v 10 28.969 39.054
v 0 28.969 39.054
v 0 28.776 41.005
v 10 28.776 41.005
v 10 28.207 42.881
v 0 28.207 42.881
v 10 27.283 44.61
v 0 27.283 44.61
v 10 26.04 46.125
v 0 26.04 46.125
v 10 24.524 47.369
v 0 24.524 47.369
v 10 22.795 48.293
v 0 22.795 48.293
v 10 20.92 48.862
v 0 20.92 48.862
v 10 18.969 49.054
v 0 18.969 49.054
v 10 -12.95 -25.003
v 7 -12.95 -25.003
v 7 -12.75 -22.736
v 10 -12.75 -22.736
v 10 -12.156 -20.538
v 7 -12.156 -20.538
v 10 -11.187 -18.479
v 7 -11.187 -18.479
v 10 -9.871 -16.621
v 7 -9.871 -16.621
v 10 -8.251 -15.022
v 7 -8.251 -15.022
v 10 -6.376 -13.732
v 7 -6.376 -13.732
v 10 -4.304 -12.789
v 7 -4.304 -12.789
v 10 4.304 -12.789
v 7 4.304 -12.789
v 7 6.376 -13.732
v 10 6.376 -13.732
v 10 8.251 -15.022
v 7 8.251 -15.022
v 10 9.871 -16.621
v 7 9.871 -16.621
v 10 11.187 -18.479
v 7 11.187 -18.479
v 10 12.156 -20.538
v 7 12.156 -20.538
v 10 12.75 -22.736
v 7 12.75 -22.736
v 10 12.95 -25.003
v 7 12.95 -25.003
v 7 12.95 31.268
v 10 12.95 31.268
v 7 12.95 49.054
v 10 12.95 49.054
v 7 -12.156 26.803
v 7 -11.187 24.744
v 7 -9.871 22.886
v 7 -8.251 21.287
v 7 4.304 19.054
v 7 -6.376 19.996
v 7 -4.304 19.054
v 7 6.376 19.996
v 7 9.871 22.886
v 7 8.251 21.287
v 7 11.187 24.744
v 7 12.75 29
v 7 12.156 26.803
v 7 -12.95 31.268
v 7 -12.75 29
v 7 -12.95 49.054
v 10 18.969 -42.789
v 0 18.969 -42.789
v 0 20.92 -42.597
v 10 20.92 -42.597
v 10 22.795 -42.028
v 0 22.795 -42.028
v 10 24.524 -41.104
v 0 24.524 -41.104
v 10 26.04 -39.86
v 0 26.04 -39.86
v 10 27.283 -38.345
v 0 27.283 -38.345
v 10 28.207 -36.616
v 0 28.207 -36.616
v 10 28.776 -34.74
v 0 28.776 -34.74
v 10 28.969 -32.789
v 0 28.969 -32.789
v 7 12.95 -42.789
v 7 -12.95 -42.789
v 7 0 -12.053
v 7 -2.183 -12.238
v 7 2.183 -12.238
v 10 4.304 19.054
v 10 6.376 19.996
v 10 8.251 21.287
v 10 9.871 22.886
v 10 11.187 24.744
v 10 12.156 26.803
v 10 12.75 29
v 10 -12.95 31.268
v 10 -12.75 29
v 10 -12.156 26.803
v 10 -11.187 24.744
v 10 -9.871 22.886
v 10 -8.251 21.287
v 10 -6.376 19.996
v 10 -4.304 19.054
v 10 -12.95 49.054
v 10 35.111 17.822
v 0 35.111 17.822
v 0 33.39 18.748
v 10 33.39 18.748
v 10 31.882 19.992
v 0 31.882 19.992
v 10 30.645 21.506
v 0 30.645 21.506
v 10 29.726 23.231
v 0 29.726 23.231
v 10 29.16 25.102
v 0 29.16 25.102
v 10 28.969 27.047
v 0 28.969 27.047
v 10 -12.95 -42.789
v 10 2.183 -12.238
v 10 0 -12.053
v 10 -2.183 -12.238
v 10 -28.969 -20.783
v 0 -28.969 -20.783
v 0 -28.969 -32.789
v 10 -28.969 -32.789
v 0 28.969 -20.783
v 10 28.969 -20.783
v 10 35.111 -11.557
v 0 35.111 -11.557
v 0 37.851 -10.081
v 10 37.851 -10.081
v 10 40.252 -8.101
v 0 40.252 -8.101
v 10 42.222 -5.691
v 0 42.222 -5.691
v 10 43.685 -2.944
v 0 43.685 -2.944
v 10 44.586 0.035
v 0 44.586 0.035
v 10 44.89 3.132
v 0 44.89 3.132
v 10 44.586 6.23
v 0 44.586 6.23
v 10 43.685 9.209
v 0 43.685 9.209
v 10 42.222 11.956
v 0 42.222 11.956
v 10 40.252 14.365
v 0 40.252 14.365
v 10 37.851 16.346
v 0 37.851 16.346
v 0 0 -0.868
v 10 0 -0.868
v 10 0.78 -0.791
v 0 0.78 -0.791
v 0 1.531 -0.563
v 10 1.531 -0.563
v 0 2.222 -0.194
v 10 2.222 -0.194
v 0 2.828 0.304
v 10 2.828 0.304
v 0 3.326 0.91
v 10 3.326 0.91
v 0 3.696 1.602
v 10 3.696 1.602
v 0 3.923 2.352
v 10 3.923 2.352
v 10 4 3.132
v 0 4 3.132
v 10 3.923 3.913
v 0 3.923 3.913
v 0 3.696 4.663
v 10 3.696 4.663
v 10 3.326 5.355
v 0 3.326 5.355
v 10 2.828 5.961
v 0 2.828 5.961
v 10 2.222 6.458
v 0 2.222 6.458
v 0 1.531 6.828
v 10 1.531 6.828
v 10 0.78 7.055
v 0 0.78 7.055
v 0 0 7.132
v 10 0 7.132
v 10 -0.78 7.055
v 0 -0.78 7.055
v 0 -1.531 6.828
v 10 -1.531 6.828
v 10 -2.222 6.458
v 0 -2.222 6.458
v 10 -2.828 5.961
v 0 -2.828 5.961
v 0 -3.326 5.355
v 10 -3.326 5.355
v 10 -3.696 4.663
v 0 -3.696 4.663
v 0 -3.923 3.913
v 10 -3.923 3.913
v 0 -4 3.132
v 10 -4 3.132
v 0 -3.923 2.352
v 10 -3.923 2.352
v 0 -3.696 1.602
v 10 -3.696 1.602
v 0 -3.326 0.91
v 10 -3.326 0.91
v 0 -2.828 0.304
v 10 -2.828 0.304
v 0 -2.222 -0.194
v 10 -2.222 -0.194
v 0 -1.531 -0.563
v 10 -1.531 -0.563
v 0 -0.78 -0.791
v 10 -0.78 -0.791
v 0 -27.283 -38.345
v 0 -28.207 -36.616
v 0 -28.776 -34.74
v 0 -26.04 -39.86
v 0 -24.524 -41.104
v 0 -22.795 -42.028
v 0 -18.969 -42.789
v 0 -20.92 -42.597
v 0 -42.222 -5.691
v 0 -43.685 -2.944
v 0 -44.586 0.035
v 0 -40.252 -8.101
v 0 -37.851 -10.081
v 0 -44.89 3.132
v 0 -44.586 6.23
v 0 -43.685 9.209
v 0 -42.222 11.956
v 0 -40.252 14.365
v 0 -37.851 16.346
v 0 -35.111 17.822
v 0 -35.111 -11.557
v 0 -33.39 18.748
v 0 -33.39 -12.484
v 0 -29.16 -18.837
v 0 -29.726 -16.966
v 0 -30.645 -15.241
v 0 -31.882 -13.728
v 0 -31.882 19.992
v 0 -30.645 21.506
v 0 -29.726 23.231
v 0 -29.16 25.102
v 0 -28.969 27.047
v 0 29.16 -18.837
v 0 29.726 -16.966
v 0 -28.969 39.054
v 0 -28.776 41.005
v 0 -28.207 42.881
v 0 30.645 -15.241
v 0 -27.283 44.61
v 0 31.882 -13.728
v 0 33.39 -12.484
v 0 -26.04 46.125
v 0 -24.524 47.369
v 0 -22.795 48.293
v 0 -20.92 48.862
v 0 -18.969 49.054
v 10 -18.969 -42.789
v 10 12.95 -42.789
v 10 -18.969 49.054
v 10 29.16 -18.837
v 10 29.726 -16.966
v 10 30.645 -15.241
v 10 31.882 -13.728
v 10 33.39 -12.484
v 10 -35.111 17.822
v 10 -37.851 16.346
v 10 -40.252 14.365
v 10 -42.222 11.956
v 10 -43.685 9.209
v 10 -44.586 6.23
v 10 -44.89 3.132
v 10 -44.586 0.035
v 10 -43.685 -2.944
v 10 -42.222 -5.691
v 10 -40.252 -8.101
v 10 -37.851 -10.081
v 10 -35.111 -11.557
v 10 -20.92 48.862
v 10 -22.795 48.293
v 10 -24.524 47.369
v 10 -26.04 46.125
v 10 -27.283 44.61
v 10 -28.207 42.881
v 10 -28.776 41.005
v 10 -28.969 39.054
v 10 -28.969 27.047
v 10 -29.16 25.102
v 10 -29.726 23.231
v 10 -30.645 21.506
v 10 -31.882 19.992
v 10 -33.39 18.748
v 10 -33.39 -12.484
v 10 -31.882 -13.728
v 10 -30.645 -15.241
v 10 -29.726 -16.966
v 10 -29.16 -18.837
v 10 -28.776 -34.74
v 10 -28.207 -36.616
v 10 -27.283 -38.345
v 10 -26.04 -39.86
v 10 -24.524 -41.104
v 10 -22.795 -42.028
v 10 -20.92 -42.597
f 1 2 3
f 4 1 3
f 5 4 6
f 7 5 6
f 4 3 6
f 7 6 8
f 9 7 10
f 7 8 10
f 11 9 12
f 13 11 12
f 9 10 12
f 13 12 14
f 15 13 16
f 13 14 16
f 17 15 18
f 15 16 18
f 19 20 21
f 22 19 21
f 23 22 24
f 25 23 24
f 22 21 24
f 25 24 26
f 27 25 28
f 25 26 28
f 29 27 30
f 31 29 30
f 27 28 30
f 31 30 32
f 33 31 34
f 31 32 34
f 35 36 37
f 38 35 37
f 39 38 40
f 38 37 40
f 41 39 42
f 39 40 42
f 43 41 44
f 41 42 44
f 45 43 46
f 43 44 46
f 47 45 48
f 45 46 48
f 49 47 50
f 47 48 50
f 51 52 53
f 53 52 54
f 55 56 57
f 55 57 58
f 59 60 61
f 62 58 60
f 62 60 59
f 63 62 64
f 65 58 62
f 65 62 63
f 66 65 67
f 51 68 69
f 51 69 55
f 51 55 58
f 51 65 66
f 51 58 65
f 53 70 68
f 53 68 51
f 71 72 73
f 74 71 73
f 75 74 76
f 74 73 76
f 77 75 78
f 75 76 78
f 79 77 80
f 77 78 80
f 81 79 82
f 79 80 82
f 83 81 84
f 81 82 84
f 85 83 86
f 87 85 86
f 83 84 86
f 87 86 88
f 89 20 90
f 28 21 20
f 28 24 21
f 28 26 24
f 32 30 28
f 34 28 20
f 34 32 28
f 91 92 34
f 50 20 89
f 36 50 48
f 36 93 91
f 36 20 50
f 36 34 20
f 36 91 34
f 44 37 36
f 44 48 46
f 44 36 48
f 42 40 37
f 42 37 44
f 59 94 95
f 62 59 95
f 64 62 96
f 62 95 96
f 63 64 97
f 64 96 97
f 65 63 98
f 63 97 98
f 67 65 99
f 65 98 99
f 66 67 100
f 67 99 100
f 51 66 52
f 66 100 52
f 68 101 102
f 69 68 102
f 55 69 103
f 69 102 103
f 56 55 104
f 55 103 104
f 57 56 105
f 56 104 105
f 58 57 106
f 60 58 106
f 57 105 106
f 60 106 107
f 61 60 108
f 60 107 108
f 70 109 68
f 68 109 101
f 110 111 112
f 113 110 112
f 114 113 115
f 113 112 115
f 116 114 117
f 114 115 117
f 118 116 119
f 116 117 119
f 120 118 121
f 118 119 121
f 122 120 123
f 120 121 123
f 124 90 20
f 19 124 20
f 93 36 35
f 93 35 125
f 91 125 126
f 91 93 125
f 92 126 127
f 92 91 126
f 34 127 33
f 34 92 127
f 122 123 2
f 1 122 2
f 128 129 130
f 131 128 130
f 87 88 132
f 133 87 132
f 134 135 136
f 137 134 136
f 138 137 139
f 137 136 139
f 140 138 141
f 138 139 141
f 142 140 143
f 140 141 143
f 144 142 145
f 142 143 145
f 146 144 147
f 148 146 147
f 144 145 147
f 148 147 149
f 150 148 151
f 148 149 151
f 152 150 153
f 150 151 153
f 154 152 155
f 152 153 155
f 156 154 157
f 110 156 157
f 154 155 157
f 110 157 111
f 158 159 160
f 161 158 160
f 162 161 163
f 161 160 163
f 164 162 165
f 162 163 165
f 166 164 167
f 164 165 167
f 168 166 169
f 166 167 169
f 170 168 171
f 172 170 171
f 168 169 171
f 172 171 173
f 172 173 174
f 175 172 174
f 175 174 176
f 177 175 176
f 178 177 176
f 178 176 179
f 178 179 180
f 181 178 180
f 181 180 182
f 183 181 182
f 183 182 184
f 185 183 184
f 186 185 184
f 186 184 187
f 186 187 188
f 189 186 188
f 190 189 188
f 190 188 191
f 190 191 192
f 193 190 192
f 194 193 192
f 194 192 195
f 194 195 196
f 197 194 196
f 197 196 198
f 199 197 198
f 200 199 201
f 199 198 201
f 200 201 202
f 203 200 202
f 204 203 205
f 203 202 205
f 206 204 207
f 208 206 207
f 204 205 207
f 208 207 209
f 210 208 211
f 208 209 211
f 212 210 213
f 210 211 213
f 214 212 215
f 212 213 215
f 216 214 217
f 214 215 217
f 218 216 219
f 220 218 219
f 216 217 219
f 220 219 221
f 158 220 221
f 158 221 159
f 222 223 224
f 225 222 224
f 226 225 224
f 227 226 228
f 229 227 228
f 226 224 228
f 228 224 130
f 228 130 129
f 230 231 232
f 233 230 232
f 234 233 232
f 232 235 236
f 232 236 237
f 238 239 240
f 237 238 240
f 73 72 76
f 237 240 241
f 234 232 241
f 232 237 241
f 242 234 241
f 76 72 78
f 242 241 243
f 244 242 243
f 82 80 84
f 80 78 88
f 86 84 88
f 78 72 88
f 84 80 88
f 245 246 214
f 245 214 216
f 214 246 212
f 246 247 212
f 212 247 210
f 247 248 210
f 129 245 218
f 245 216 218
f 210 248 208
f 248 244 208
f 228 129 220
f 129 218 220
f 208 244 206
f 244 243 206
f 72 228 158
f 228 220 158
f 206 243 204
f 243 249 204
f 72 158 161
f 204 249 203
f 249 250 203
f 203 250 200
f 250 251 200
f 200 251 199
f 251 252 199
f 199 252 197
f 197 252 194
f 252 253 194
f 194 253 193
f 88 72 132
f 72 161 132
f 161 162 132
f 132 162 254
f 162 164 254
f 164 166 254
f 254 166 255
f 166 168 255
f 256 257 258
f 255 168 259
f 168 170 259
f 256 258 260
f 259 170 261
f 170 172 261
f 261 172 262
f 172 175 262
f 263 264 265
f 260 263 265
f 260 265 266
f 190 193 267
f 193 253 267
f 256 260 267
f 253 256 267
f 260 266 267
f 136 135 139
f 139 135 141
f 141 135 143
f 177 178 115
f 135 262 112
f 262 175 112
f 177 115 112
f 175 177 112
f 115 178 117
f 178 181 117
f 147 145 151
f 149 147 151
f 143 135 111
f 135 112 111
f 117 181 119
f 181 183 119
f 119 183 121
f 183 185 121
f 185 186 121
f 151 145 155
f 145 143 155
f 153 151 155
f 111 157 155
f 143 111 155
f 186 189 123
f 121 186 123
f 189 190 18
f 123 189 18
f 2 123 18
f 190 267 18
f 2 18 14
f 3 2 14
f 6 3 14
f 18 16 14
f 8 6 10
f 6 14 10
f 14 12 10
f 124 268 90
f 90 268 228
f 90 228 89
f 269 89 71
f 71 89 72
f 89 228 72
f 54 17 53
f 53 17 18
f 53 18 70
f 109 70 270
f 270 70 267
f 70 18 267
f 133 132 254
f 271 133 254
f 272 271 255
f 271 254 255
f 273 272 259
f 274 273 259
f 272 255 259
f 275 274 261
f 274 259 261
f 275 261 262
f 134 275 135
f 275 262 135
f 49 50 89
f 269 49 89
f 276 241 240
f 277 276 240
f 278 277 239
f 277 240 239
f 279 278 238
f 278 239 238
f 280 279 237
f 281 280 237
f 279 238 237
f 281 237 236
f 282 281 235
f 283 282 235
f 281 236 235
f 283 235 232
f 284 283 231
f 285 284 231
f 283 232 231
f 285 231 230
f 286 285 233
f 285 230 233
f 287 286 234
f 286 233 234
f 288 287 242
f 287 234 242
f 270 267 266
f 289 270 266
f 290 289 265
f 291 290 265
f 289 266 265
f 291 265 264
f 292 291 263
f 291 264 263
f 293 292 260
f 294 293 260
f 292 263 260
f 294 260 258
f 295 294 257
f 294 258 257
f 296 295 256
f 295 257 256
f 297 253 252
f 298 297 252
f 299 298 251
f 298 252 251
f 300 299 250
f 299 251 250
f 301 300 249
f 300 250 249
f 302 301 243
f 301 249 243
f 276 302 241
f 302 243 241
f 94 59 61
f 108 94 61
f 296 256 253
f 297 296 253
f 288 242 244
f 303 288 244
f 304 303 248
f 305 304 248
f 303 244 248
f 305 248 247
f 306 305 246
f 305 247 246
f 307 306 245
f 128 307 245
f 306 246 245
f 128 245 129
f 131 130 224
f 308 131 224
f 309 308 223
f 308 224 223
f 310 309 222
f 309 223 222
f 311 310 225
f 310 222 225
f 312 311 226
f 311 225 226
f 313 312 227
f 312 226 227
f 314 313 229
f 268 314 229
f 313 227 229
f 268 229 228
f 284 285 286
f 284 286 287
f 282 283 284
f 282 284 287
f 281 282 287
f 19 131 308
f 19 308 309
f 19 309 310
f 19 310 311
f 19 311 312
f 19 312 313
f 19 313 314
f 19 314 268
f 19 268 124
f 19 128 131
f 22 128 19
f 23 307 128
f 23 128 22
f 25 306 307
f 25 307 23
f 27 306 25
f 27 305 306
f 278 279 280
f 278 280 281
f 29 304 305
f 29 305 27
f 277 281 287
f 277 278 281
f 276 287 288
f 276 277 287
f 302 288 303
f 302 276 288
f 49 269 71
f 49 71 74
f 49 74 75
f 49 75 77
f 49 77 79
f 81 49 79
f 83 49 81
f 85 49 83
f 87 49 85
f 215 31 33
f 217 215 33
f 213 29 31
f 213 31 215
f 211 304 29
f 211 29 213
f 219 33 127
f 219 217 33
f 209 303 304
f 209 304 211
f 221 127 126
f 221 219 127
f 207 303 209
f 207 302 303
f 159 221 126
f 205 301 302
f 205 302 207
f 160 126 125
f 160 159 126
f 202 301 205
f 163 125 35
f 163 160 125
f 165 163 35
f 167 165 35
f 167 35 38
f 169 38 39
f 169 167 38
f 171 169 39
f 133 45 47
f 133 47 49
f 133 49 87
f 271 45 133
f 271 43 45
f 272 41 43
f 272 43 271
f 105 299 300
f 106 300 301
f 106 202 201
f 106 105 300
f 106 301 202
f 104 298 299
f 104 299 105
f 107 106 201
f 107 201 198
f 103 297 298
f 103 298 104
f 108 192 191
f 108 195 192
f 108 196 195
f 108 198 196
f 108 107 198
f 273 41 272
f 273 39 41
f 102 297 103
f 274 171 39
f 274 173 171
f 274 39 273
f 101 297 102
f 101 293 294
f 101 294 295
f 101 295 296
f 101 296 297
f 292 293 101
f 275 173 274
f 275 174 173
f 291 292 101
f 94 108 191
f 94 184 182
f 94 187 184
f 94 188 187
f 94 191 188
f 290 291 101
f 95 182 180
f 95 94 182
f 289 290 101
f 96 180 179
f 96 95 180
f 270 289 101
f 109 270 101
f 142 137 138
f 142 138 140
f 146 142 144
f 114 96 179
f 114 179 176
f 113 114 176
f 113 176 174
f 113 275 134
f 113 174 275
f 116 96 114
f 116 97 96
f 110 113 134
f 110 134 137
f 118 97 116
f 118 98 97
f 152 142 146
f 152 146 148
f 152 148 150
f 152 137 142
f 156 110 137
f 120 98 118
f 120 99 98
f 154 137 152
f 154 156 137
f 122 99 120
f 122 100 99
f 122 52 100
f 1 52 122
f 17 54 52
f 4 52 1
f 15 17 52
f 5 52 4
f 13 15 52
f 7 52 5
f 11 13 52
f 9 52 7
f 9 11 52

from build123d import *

# Parameters (mm, degrees)
BOSS_EXTRUDE3_DEPTH = 10
SKETCH3_R           = 4
CUT_EXTRUDE3_DEPTH  = 14.0462
CUT_EXTRUDE4_DEPTH  = 3


with BuildPart() as part:
    # Sketch1 → Boss-Extrude3 (new body)
    with BuildSketch(Plane.YZ):
        with BuildLine():
            Line((-28.968617751, -12.789334175), (28.968617751, -12.789334175))
            ThreePointArc((28.968617751, -12.789334175), (44.579120821, 0), (35.110840206, 17.821518929))
            ThreePointArc((35.110840206, 17.821518929), (30.644623053, 21.505675602), (28.968617751, 27.047436358))
            Line((28.968617751, 27.047436358), (28.968617751, 39.053986921))
            ThreePointArc((28.968617751, 39.053986921), (26.039685563, 46.125054733), (18.968617751, 49.053986921))
            Line((18.968617751, 49.053986921), (-18.968617751, 49.053986921))
            ThreePointArc((-18.968617751, 49.053986921), (-26.039685563, 46.125054733), (-28.968617751, 39.053986921))
            Line((-28.968617751, 39.053986921), (-28.968617751, 27.047436358))
            ThreePointArc((-28.968617751, 27.047436358), (-30.644623053, 21.505675602), (-35.110840206, 17.821518929))
            ThreePointArc((-35.110840206, 17.821518929), (-44.579120821, 0), (-28.968617751, -12.789334175))
        make_face()
    boss_extrude3 = extrude(amount=BOSS_EXTRUDE3_DEPTH)

    # Sketch3 → Cut-Extrude3 (cut)
    with BuildSketch(Plane.YZ.offset(10)):
        with Locations((0, 3.132326373)):
            Circle(SKETCH3_R)
    cut_extrude3 = extrude(amount=-CUT_EXTRUDE3_DEPTH, mode=Mode.SUBTRACT)

    # Sketch4 → Cut-Extrude4 (cut)
    with BuildSketch(Plane.YZ.offset(10)):
        with BuildLine():
            Line((-12.95, 49.053986921), (-12.95, 31.267703884))
            ThreePointArc((-12.95, 31.267703884), (0, 18.317703884), (12.95, 31.267703884))
            Line((12.95, 31.267703884), (12.95, 49.053986921))
            Line((12.95, 49.053986921), (-12.95, 49.053986921))
        make_face()
    cut_extrude4 = extrude(amount=-CUT_EXTRUDE4_DEPTH, mode=Mode.SUBTRACT)

    # Mirror1: Boss-Extrude3, Cut-Extrude3, Cut-Extrude4 across plane
    add(boss_extrude3.mirror(Plane.XY.offset(3.132326373)))
    add(cut_extrude3.mirror(Plane.XY.offset(3.132326373)), mode=Mode.SUBTRACT)
    add(cut_extrude4.mirror(Plane.XY.offset(3.132326373)), mode=Mode.SUBTRACT)


solid = part.part
